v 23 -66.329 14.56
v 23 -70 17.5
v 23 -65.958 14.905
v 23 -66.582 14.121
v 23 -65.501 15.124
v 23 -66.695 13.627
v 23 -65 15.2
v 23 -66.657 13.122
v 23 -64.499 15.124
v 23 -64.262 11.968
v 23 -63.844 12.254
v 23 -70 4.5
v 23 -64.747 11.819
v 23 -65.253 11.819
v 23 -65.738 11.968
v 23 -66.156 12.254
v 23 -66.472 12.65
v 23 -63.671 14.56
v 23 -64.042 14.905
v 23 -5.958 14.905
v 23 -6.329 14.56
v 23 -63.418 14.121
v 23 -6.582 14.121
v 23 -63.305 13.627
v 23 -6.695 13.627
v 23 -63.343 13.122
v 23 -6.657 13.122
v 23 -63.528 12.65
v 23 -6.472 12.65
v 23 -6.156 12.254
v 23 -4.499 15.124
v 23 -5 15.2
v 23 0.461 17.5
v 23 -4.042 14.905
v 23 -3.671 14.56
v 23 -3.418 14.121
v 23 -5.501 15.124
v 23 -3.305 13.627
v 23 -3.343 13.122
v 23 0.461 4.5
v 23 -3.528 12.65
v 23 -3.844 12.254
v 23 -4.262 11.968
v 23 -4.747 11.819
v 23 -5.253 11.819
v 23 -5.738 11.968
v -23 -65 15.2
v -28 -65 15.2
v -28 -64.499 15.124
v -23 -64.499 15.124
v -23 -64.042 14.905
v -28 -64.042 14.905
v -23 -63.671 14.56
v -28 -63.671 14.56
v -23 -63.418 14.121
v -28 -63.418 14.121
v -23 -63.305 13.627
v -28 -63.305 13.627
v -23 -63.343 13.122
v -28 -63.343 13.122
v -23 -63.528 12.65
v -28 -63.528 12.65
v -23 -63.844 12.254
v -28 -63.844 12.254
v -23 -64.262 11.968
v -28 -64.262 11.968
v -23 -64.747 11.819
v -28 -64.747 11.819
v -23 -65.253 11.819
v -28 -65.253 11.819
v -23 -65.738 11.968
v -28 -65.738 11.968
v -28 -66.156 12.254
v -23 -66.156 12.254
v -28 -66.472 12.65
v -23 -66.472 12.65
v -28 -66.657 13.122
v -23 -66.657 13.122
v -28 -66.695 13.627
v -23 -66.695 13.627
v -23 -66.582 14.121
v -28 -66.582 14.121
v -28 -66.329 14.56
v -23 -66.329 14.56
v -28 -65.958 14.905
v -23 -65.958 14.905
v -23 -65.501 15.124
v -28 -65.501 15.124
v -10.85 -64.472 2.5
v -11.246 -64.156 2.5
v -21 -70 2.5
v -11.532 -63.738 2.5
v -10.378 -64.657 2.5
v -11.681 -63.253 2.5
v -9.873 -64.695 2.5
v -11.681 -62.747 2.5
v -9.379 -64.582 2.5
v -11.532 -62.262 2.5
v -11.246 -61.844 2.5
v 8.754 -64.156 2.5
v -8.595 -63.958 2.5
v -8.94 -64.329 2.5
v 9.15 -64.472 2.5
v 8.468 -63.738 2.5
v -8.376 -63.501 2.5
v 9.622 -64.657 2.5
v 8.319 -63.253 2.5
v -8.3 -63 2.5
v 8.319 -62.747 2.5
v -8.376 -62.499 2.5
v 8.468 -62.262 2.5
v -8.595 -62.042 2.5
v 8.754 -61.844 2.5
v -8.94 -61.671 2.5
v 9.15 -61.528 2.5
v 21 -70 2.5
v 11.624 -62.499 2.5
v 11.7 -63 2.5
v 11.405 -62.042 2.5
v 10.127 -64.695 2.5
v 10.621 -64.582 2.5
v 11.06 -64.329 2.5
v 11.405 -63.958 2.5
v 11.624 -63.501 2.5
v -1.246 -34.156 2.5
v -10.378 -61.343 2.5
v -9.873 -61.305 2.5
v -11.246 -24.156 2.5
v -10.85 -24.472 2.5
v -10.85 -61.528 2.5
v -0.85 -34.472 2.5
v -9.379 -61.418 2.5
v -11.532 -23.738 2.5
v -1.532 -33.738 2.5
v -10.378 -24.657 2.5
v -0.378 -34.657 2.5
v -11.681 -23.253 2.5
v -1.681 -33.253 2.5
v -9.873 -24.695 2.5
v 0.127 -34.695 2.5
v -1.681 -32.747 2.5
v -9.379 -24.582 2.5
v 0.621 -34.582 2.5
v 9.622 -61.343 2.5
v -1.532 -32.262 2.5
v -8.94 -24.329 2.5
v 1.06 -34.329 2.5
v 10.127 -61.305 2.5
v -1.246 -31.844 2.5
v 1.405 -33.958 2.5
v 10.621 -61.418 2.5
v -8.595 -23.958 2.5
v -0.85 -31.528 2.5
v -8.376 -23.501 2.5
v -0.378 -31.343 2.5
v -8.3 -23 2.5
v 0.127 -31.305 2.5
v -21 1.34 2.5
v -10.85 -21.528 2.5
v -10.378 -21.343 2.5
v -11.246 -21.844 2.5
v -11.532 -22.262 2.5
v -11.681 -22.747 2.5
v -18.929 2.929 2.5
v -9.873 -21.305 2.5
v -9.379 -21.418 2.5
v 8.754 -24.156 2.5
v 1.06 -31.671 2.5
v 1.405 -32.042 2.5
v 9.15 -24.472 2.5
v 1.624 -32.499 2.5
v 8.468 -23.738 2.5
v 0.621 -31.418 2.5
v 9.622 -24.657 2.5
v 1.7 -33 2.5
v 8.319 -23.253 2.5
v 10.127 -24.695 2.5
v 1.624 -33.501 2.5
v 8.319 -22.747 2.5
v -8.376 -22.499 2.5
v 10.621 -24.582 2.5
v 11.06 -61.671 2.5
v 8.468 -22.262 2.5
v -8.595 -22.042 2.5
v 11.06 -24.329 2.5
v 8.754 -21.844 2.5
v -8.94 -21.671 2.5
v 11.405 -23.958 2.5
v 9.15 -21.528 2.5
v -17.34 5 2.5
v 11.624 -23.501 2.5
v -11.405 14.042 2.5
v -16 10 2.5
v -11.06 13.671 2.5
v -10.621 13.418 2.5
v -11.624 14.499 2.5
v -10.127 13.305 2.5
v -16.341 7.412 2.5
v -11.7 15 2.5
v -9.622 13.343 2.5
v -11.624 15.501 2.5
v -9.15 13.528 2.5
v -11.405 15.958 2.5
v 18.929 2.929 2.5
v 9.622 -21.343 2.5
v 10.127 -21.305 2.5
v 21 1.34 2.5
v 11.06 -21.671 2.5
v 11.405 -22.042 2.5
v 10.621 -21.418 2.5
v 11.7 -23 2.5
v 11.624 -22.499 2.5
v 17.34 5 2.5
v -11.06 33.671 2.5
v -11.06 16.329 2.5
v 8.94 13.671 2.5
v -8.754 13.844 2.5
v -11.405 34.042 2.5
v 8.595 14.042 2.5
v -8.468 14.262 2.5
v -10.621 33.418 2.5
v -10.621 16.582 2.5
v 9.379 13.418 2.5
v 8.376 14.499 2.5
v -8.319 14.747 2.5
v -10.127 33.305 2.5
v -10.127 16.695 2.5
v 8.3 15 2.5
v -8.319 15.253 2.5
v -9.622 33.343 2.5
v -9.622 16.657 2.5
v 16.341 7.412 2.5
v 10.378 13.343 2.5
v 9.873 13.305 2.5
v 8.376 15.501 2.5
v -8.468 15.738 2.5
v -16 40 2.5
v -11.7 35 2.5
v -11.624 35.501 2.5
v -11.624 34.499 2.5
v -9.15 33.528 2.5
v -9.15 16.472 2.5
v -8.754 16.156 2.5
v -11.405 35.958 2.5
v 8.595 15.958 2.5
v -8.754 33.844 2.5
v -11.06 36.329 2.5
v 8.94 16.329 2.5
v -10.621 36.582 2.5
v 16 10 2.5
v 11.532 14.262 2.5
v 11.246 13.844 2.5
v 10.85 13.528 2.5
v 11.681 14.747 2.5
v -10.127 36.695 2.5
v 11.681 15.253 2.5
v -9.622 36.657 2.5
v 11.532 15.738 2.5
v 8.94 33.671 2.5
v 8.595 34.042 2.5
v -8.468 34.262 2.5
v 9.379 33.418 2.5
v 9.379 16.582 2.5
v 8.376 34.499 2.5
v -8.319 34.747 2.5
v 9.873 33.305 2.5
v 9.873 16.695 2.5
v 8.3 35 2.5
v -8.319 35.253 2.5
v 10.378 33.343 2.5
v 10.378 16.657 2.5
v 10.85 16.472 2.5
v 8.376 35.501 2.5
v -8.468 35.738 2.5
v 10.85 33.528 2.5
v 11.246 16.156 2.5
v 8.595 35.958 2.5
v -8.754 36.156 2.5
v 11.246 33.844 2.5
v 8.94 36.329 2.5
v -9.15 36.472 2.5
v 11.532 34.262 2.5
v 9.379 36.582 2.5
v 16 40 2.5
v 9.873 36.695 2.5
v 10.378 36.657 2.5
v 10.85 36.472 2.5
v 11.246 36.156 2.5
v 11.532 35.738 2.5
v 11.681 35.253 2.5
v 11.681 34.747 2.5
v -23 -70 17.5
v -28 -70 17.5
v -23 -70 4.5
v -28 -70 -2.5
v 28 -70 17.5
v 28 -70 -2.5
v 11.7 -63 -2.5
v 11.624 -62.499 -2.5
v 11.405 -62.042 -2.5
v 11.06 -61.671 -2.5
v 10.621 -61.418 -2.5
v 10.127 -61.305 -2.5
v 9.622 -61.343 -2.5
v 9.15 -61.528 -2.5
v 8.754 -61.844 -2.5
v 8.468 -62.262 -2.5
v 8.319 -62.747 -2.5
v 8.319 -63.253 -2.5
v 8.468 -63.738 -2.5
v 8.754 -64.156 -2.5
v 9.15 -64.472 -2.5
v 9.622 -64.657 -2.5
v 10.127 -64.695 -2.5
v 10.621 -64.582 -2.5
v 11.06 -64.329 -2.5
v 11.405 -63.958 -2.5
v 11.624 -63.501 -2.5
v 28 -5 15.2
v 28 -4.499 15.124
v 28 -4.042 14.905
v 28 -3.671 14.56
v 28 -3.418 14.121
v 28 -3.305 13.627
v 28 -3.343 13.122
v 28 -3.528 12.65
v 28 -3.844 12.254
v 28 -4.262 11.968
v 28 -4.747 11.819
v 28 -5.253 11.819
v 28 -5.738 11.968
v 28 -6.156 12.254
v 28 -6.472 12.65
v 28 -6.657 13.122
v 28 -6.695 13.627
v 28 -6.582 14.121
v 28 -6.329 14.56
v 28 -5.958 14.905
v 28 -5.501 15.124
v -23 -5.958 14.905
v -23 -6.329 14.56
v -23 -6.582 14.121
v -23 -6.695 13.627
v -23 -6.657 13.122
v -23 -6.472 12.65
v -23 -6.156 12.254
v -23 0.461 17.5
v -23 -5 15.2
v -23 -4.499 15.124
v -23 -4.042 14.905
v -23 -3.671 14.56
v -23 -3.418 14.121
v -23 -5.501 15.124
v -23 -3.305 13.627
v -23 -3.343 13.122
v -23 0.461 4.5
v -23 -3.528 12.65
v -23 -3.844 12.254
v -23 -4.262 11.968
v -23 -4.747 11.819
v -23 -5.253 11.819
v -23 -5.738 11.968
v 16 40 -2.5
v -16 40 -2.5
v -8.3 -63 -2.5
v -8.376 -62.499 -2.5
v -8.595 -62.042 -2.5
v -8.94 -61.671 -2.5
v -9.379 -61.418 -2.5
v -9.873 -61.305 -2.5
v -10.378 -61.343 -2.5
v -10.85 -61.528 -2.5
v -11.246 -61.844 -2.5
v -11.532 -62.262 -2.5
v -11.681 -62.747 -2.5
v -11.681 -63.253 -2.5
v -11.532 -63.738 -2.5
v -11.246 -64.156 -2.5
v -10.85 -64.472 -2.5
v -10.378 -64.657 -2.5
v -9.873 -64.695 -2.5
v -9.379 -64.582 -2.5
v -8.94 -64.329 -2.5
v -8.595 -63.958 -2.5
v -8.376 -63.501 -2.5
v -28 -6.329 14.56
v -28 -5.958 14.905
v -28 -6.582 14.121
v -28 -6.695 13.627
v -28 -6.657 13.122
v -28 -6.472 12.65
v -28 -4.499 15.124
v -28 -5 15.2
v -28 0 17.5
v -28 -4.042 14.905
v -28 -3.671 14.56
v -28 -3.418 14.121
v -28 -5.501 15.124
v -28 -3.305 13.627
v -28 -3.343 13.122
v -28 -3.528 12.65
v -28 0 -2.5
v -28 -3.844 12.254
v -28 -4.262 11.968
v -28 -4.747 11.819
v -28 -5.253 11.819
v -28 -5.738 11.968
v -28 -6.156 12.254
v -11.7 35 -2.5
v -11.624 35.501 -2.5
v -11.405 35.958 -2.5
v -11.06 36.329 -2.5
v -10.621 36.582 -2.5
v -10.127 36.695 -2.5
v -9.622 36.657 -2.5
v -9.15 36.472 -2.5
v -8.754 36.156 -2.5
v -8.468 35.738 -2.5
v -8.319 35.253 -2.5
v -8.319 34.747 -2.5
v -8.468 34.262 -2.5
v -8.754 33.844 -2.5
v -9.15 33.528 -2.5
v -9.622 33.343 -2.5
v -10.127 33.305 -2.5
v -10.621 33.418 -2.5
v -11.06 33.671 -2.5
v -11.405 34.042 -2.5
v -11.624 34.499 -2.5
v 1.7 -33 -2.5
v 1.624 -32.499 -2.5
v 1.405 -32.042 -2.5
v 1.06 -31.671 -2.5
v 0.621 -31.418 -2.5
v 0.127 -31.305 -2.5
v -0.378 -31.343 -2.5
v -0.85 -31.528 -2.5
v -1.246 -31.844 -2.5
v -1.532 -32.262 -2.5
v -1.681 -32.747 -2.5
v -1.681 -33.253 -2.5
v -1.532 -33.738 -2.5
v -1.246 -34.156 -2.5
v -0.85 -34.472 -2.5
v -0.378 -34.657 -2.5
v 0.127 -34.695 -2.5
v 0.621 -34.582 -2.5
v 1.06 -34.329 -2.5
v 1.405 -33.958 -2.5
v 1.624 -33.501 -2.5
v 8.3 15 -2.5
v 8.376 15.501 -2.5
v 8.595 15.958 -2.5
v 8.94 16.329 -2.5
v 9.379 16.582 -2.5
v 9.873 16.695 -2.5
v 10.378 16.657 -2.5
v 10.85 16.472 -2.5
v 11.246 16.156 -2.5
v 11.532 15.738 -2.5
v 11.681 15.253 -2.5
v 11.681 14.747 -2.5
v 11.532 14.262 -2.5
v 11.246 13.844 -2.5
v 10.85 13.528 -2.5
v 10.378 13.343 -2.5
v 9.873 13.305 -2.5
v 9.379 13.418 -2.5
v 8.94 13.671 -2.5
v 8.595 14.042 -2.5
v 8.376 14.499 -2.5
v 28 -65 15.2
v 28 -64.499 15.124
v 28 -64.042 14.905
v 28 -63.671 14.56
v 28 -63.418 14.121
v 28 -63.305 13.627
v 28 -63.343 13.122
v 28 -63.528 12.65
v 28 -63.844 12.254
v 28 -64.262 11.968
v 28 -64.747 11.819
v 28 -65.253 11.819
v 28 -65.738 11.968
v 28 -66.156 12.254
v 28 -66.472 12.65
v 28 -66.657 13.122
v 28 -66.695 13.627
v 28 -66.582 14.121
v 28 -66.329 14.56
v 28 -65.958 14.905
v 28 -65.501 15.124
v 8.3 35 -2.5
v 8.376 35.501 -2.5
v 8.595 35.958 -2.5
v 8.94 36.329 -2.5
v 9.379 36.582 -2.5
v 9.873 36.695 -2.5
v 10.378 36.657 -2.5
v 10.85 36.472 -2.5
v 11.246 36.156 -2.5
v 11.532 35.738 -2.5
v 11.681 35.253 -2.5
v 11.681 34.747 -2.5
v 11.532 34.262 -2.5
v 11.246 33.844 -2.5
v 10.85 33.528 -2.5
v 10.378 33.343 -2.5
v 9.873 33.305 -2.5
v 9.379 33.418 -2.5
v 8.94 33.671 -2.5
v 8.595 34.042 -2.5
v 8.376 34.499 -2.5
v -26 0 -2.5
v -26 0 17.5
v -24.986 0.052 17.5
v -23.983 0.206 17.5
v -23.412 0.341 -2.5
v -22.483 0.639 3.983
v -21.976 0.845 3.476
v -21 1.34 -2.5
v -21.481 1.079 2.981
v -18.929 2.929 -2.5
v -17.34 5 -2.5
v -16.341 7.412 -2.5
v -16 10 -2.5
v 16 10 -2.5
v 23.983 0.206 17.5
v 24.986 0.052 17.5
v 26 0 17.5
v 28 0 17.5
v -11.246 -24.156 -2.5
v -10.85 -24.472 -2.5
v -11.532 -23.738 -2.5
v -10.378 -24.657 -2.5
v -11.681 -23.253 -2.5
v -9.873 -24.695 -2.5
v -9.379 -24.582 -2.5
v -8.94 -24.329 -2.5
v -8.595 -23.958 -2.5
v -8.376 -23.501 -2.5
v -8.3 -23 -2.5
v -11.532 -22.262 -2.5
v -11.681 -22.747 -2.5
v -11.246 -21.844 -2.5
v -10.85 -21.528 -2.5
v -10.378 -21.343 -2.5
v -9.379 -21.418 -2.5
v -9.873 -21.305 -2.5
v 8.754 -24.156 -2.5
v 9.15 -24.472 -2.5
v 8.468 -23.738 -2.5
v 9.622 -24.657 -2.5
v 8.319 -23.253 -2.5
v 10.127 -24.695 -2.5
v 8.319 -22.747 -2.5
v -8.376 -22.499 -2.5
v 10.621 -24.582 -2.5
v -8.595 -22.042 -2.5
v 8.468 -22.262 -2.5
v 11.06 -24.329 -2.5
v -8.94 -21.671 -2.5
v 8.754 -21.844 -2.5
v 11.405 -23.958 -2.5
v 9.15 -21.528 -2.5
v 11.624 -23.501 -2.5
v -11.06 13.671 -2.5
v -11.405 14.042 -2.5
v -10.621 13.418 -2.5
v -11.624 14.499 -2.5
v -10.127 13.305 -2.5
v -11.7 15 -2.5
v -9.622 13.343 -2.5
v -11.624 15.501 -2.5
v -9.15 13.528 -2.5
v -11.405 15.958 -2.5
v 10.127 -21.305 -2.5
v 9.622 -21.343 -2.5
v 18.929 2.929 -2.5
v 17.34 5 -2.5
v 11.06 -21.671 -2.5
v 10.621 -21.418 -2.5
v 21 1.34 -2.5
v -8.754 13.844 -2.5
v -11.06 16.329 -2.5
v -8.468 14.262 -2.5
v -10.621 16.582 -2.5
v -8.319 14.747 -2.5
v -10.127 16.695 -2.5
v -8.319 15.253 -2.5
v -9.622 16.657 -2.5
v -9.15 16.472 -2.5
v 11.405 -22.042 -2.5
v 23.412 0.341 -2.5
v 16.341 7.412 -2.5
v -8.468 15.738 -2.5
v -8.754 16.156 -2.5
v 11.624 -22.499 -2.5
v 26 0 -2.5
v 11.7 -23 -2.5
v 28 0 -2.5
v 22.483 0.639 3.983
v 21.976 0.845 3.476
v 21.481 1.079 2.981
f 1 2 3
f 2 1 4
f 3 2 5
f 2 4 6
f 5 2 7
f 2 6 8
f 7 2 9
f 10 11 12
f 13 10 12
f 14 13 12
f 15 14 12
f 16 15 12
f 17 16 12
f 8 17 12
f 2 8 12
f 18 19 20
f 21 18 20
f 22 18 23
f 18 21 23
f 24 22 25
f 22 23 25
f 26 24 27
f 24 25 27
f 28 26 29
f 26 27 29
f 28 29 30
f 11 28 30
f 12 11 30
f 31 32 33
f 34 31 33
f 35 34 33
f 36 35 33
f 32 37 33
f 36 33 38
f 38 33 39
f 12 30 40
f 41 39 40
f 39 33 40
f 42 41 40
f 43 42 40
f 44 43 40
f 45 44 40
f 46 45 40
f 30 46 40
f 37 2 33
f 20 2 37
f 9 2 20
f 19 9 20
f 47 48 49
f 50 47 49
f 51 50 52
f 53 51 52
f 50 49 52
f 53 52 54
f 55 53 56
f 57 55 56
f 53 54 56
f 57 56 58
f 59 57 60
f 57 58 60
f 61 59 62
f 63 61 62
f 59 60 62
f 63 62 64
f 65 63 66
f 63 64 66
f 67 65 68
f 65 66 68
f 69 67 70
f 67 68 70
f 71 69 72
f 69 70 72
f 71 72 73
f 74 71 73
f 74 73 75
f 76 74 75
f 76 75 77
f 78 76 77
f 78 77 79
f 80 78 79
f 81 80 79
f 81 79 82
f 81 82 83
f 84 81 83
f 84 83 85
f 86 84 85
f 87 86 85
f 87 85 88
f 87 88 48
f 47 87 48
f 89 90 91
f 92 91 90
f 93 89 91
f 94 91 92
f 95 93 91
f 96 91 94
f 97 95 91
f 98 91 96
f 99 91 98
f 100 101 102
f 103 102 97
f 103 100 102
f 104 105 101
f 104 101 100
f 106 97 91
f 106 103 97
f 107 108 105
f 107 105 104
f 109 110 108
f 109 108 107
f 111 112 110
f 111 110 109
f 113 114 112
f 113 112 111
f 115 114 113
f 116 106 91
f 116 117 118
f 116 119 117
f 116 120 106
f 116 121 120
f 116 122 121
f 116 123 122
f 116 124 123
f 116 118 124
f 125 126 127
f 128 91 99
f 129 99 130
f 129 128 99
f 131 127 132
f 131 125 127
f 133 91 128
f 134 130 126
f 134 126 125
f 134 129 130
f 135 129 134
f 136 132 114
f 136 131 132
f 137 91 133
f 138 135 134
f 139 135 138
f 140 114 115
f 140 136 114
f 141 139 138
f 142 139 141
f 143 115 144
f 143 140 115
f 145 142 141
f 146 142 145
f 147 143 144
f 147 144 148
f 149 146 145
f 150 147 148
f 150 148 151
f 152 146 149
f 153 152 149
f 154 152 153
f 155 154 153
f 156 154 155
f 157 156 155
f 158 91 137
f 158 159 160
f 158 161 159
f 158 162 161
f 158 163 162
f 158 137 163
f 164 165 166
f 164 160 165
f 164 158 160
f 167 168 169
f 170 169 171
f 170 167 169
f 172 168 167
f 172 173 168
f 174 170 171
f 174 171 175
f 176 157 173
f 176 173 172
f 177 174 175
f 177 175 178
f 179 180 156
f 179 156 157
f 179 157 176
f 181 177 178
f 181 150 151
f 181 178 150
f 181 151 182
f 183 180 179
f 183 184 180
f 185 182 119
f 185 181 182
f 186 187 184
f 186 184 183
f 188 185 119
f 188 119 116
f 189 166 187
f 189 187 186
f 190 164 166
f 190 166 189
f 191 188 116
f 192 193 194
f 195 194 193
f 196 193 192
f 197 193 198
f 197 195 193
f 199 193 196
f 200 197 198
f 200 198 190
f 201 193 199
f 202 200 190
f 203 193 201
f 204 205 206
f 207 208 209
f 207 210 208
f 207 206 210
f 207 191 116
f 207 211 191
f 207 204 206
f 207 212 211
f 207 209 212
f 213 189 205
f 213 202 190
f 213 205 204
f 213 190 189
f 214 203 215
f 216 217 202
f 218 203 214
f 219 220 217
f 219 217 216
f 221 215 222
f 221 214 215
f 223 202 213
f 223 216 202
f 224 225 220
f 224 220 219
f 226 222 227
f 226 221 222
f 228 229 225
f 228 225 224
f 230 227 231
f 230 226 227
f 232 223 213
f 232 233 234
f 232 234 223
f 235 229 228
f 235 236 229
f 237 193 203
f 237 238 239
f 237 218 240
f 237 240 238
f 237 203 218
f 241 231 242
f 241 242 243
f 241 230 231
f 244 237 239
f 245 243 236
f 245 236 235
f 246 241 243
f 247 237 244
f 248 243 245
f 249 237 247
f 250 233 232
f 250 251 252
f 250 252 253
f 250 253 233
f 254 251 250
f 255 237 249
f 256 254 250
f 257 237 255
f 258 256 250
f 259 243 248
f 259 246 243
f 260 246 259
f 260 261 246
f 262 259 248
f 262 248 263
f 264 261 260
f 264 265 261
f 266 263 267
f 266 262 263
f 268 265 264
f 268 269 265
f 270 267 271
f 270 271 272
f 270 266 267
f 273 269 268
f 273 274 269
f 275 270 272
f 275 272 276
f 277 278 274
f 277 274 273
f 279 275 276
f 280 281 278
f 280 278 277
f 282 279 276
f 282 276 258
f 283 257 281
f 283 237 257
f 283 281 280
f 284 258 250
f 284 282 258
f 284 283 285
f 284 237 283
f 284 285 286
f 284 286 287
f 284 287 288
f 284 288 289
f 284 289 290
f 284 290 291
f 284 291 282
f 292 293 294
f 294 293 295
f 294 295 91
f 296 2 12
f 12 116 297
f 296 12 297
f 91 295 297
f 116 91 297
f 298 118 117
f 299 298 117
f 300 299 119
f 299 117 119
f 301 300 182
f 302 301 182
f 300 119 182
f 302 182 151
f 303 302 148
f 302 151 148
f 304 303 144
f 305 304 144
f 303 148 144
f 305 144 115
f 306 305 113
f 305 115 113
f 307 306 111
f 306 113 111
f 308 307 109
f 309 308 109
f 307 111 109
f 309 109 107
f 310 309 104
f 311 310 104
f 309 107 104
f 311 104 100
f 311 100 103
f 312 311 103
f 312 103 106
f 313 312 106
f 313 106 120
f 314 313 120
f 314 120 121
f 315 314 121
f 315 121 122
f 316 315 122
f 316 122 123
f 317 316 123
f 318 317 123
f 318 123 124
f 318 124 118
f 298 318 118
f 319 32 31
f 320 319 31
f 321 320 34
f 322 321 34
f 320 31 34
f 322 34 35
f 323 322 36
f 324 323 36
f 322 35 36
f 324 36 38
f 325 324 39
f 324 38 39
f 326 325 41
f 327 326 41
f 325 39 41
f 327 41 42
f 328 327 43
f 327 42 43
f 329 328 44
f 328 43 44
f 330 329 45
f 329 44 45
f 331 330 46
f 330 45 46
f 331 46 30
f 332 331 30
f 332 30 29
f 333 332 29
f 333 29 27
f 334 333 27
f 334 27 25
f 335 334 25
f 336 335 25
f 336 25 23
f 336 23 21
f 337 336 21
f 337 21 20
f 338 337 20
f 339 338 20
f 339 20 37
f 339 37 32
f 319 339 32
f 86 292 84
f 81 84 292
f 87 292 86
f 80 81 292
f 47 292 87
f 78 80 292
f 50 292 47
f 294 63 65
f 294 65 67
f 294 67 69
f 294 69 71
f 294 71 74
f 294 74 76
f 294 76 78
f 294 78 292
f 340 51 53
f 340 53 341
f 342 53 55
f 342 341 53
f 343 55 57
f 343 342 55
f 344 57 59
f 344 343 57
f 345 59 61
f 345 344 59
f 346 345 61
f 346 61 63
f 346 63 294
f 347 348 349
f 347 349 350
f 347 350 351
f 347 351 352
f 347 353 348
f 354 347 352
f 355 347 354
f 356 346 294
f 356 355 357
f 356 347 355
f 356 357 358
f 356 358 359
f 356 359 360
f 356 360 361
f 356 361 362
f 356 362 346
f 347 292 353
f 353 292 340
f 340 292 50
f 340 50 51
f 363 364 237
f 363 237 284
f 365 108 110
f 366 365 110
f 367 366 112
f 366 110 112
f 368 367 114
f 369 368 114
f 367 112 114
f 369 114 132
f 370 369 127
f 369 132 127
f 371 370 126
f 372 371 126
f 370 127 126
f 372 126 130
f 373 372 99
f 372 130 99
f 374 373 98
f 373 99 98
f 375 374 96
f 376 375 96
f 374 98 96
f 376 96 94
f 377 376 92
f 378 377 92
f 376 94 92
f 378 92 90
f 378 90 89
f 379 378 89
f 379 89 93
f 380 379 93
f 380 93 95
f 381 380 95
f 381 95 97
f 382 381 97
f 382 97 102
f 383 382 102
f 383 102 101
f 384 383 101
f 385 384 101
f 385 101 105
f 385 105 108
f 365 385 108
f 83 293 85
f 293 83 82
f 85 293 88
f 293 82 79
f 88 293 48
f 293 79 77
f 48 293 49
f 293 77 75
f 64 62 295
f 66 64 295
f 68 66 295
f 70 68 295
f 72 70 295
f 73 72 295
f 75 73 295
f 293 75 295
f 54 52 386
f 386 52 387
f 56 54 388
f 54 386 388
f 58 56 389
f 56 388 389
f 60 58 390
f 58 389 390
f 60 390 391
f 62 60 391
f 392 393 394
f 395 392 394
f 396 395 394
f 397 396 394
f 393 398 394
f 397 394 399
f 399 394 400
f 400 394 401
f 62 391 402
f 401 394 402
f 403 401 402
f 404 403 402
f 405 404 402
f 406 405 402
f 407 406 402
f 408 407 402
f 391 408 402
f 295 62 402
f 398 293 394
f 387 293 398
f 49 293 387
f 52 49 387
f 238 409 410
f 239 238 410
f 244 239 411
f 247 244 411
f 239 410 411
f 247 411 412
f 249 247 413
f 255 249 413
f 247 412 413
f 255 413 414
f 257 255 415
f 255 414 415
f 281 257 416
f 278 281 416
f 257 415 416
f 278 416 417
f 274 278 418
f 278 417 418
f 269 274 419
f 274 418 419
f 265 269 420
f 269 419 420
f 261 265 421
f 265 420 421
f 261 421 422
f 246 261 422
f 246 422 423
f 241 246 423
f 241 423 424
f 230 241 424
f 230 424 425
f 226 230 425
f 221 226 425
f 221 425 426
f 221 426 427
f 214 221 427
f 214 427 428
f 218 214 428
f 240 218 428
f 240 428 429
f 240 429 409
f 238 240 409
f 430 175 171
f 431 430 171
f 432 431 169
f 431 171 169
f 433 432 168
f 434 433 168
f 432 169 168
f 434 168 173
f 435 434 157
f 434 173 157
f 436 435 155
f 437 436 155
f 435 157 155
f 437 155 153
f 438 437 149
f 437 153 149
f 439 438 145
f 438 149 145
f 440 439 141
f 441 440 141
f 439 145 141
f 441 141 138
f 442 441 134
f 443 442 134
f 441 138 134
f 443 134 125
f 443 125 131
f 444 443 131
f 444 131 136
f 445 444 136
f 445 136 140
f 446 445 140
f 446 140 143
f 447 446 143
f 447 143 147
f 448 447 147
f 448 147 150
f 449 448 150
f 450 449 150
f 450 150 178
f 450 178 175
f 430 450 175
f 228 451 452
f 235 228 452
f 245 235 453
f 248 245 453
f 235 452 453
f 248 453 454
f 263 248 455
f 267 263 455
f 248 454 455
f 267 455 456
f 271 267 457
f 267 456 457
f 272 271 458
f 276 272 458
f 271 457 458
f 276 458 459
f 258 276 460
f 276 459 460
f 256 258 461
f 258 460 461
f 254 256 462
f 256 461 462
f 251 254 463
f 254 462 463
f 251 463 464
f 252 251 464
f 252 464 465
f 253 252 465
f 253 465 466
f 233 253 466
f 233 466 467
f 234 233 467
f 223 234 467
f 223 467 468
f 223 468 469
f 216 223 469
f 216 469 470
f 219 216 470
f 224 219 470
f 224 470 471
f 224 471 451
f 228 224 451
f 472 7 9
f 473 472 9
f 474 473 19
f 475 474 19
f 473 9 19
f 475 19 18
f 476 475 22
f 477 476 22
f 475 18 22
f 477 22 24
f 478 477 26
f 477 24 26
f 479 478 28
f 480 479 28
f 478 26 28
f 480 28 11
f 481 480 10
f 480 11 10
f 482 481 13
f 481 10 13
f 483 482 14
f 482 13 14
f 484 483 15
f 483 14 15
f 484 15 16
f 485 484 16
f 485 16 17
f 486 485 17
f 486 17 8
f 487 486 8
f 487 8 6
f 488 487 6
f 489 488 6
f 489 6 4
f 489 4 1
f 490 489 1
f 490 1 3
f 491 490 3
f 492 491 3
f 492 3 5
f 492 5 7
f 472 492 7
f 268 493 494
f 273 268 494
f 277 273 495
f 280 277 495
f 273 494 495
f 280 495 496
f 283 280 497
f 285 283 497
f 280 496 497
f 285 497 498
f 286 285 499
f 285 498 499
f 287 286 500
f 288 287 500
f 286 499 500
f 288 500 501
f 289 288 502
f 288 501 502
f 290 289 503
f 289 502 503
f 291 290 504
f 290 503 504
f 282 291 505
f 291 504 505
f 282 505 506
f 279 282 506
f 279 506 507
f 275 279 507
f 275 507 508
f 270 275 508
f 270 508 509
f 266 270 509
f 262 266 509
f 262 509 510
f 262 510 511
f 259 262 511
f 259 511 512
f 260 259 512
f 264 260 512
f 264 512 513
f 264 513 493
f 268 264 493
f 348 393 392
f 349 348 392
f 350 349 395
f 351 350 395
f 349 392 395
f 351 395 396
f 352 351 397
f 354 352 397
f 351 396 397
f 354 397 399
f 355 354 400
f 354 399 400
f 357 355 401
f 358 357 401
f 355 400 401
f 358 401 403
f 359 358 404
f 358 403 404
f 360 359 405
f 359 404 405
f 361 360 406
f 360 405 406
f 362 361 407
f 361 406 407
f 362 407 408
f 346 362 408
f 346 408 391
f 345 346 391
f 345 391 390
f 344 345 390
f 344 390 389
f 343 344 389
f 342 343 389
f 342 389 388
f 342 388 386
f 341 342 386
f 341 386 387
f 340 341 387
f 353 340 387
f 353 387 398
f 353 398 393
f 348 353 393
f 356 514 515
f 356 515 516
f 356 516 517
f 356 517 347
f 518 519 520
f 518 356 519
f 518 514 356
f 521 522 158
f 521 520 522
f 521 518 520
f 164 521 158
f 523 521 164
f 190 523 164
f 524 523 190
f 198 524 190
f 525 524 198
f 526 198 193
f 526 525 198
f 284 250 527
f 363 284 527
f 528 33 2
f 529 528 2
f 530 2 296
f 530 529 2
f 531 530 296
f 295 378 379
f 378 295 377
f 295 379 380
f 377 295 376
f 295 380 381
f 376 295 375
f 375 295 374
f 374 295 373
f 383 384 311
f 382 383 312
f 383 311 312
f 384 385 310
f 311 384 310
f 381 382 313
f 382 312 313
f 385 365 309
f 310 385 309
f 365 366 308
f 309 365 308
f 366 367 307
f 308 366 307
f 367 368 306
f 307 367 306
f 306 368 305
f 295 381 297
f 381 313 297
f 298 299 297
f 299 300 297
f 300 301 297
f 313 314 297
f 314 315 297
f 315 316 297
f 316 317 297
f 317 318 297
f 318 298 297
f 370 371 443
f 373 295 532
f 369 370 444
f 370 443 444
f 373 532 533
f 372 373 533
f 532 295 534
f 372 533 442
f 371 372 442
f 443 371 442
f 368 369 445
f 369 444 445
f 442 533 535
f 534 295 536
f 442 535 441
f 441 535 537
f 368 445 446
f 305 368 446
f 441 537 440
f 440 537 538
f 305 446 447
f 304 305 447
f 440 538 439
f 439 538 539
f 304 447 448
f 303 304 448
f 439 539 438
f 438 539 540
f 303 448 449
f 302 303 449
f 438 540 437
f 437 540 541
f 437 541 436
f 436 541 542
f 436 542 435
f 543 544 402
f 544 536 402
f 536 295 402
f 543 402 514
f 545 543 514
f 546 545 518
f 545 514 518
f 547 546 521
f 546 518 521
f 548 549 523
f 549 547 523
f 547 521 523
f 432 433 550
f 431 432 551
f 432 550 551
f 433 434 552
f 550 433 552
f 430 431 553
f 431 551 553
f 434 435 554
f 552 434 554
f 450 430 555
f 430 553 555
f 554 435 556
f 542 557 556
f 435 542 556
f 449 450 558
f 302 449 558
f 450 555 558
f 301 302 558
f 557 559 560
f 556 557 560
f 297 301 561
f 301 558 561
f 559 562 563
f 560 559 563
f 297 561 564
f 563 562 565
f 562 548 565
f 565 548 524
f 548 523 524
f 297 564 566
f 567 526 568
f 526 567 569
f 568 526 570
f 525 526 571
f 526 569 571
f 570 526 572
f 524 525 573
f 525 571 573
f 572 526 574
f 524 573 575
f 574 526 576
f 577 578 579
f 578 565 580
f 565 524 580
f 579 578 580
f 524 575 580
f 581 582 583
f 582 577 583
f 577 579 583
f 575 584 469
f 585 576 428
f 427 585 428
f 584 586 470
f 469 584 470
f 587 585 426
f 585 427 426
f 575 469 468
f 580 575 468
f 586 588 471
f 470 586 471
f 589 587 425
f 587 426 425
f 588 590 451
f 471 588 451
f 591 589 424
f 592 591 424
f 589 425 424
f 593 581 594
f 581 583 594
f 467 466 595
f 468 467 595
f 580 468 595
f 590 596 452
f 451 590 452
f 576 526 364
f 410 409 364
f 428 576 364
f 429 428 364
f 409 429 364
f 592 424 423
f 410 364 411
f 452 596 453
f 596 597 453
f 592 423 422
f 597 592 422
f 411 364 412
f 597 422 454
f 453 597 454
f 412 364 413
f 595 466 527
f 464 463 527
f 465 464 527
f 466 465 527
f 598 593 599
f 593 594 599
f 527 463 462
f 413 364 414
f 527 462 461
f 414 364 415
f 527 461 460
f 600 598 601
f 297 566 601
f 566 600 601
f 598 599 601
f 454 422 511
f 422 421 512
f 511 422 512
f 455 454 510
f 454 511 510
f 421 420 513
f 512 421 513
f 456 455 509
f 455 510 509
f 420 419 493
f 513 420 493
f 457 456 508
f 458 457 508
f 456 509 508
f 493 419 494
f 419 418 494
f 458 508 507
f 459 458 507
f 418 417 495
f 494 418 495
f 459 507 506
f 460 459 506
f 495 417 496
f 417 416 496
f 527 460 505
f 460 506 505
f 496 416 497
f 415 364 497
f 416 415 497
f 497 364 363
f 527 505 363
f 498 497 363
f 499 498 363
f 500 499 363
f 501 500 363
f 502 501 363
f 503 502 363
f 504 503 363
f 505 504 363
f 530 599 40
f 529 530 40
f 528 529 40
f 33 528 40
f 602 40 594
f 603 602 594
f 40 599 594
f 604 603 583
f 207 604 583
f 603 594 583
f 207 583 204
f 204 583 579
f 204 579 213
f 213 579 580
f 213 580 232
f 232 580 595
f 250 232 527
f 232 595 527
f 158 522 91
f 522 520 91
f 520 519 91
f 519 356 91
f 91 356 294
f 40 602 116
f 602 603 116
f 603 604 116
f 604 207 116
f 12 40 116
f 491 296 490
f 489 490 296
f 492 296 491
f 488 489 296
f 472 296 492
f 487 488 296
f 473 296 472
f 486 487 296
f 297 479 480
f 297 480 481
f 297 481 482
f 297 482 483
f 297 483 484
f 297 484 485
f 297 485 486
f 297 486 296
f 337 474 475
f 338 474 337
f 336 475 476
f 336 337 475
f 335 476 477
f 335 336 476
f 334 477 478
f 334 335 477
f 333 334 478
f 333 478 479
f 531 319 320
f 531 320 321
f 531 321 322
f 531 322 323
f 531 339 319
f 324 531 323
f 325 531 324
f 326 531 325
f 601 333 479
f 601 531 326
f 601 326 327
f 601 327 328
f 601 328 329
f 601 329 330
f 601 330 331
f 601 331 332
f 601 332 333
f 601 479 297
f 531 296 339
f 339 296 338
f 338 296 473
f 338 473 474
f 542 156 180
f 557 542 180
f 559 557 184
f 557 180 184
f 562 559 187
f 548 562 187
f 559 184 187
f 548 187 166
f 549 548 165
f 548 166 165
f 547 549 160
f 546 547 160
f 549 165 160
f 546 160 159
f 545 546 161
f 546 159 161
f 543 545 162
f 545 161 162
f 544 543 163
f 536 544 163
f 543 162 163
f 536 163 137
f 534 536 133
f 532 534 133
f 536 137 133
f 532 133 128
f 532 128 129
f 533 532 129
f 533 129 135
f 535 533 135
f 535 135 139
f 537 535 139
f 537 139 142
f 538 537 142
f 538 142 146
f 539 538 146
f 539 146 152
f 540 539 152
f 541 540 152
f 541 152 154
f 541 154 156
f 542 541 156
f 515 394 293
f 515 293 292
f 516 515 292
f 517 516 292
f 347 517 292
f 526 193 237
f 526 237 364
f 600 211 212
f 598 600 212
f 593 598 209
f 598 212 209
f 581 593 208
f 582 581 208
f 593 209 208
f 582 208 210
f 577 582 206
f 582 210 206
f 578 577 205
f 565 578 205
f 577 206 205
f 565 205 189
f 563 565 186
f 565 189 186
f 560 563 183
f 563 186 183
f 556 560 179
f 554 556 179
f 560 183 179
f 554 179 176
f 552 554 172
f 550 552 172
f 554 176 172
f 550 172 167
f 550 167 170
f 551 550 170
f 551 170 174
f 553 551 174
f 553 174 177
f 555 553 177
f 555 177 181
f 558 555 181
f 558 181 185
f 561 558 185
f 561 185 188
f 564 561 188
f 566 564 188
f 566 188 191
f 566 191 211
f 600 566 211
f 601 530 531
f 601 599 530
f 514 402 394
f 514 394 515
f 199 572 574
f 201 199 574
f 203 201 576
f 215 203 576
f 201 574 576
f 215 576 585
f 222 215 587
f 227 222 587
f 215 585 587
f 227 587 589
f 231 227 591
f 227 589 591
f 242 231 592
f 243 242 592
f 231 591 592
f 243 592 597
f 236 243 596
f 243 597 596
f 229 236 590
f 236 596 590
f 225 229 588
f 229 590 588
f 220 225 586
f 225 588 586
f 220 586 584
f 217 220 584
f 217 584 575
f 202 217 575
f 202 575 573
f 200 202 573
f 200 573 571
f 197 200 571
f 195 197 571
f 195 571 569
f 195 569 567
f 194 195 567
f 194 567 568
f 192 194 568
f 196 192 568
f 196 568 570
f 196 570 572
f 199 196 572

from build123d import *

# Parameters (mm, degrees)
SKETCH1_W            = 32
SKETCH1_H            = 5
BOSS_EXTRUDE1_DEPTH  = 40
M3_CLEARANCE_HOLE3_D = 3.4
SKETCH4_W            = 46
SKETCH4_H            = 5
BOSS_EXTRUDE2_DEPTH  = 70
SKETCH5_W            = 5
SKETCH5_H            = 20
BOSS_EXTRUDE3_DEPTH  = 70
M3_CLEARANCE_HOLE1_D = 3.4
M3_CLEARANCE_HOLE2_D = 3.4
FILLET2_R            = 10
FILLET4_SIZE         = 2


with BuildPart() as part:
    # Sketch1 → Boss-Extrude1 (new body)
    with BuildSketch(Plane(origin=(0, 0, 0), x_dir=(1, 0, 0), z_dir=(0, 1, 0))):
        Rectangle(SKETCH1_W, SKETCH1_H)
    extrude(amount=BOSS_EXTRUDE1_DEPTH)

    # M3 Clearance Hole3 (through all)
    with Locations(Plane.XY.offset(2.5)):
        with Locations((-10, 35), (10, 35), (10, 15), (-10, 15)):
            Hole(M3_CLEARANCE_HOLE3_D / 2)

    # Sketch4 → Boss-Extrude2 (add)
    with BuildSketch(Plane(origin=(0, 0, 0), x_dir=(1, 0, 0), z_dir=(0, 1, 0))):
        Rectangle(SKETCH4_W, SKETCH4_H)
    extrude(amount=-BOSS_EXTRUDE2_DEPTH)

    # Sketch5 → Boss-Extrude3 (add)
    with BuildSketch(Plane(origin=(0, 0, 0), x_dir=(1, 0, 0), z_dir=(0, 1, 0))):
        with Locations((25.5, -7.5)):
            Rectangle(SKETCH5_W, SKETCH5_H)
        with Locations((-25.5, -7.5)):
            Rectangle(SKETCH5_W, SKETCH5_H)
    extrude(amount=-BOSS_EXTRUDE3_DEPTH)

    # M3 Clearance Hole1 (through all)
    with Locations(Plane(origin=(28, 0, 0), x_dir=(0, 0, -1), z_dir=(1, 0, 0))):
        with Locations((-13.5, -5), (-13.5, -65)):
            Hole(M3_CLEARANCE_HOLE1_D / 2)

    # M3 Clearance Hole2 (through all)
    with Locations(Plane(origin=(0, 0, -2.5), x_dir=(-1, 0, 0), z_dir=(0, 0, -1))):
        with Locations((-10, -23), (10, -23), (0, -33), (-10, -63), (10, -63)):
            Hole(M3_CLEARANCE_HOLE2_D / 2)

    # Fillet2
    fillet2_edges = [part.edges().sort_by_distance(p)[0] for p in [
        (-16, 0, 0),
        (16, 0, 0),
    ]]
    fillet(fillet2_edges, radius=FILLET2_R)

    # Fillet4
    fillet4_edges = [part.edges().sort_by_distance(p)[0] for p in [
        (-23, -34.769696007, 2.5),
        (23, -34.769696007, 2.5),
    ]]
    chamfer(fillet4_edges, length=FILLET4_SIZE)


solid = part.part
